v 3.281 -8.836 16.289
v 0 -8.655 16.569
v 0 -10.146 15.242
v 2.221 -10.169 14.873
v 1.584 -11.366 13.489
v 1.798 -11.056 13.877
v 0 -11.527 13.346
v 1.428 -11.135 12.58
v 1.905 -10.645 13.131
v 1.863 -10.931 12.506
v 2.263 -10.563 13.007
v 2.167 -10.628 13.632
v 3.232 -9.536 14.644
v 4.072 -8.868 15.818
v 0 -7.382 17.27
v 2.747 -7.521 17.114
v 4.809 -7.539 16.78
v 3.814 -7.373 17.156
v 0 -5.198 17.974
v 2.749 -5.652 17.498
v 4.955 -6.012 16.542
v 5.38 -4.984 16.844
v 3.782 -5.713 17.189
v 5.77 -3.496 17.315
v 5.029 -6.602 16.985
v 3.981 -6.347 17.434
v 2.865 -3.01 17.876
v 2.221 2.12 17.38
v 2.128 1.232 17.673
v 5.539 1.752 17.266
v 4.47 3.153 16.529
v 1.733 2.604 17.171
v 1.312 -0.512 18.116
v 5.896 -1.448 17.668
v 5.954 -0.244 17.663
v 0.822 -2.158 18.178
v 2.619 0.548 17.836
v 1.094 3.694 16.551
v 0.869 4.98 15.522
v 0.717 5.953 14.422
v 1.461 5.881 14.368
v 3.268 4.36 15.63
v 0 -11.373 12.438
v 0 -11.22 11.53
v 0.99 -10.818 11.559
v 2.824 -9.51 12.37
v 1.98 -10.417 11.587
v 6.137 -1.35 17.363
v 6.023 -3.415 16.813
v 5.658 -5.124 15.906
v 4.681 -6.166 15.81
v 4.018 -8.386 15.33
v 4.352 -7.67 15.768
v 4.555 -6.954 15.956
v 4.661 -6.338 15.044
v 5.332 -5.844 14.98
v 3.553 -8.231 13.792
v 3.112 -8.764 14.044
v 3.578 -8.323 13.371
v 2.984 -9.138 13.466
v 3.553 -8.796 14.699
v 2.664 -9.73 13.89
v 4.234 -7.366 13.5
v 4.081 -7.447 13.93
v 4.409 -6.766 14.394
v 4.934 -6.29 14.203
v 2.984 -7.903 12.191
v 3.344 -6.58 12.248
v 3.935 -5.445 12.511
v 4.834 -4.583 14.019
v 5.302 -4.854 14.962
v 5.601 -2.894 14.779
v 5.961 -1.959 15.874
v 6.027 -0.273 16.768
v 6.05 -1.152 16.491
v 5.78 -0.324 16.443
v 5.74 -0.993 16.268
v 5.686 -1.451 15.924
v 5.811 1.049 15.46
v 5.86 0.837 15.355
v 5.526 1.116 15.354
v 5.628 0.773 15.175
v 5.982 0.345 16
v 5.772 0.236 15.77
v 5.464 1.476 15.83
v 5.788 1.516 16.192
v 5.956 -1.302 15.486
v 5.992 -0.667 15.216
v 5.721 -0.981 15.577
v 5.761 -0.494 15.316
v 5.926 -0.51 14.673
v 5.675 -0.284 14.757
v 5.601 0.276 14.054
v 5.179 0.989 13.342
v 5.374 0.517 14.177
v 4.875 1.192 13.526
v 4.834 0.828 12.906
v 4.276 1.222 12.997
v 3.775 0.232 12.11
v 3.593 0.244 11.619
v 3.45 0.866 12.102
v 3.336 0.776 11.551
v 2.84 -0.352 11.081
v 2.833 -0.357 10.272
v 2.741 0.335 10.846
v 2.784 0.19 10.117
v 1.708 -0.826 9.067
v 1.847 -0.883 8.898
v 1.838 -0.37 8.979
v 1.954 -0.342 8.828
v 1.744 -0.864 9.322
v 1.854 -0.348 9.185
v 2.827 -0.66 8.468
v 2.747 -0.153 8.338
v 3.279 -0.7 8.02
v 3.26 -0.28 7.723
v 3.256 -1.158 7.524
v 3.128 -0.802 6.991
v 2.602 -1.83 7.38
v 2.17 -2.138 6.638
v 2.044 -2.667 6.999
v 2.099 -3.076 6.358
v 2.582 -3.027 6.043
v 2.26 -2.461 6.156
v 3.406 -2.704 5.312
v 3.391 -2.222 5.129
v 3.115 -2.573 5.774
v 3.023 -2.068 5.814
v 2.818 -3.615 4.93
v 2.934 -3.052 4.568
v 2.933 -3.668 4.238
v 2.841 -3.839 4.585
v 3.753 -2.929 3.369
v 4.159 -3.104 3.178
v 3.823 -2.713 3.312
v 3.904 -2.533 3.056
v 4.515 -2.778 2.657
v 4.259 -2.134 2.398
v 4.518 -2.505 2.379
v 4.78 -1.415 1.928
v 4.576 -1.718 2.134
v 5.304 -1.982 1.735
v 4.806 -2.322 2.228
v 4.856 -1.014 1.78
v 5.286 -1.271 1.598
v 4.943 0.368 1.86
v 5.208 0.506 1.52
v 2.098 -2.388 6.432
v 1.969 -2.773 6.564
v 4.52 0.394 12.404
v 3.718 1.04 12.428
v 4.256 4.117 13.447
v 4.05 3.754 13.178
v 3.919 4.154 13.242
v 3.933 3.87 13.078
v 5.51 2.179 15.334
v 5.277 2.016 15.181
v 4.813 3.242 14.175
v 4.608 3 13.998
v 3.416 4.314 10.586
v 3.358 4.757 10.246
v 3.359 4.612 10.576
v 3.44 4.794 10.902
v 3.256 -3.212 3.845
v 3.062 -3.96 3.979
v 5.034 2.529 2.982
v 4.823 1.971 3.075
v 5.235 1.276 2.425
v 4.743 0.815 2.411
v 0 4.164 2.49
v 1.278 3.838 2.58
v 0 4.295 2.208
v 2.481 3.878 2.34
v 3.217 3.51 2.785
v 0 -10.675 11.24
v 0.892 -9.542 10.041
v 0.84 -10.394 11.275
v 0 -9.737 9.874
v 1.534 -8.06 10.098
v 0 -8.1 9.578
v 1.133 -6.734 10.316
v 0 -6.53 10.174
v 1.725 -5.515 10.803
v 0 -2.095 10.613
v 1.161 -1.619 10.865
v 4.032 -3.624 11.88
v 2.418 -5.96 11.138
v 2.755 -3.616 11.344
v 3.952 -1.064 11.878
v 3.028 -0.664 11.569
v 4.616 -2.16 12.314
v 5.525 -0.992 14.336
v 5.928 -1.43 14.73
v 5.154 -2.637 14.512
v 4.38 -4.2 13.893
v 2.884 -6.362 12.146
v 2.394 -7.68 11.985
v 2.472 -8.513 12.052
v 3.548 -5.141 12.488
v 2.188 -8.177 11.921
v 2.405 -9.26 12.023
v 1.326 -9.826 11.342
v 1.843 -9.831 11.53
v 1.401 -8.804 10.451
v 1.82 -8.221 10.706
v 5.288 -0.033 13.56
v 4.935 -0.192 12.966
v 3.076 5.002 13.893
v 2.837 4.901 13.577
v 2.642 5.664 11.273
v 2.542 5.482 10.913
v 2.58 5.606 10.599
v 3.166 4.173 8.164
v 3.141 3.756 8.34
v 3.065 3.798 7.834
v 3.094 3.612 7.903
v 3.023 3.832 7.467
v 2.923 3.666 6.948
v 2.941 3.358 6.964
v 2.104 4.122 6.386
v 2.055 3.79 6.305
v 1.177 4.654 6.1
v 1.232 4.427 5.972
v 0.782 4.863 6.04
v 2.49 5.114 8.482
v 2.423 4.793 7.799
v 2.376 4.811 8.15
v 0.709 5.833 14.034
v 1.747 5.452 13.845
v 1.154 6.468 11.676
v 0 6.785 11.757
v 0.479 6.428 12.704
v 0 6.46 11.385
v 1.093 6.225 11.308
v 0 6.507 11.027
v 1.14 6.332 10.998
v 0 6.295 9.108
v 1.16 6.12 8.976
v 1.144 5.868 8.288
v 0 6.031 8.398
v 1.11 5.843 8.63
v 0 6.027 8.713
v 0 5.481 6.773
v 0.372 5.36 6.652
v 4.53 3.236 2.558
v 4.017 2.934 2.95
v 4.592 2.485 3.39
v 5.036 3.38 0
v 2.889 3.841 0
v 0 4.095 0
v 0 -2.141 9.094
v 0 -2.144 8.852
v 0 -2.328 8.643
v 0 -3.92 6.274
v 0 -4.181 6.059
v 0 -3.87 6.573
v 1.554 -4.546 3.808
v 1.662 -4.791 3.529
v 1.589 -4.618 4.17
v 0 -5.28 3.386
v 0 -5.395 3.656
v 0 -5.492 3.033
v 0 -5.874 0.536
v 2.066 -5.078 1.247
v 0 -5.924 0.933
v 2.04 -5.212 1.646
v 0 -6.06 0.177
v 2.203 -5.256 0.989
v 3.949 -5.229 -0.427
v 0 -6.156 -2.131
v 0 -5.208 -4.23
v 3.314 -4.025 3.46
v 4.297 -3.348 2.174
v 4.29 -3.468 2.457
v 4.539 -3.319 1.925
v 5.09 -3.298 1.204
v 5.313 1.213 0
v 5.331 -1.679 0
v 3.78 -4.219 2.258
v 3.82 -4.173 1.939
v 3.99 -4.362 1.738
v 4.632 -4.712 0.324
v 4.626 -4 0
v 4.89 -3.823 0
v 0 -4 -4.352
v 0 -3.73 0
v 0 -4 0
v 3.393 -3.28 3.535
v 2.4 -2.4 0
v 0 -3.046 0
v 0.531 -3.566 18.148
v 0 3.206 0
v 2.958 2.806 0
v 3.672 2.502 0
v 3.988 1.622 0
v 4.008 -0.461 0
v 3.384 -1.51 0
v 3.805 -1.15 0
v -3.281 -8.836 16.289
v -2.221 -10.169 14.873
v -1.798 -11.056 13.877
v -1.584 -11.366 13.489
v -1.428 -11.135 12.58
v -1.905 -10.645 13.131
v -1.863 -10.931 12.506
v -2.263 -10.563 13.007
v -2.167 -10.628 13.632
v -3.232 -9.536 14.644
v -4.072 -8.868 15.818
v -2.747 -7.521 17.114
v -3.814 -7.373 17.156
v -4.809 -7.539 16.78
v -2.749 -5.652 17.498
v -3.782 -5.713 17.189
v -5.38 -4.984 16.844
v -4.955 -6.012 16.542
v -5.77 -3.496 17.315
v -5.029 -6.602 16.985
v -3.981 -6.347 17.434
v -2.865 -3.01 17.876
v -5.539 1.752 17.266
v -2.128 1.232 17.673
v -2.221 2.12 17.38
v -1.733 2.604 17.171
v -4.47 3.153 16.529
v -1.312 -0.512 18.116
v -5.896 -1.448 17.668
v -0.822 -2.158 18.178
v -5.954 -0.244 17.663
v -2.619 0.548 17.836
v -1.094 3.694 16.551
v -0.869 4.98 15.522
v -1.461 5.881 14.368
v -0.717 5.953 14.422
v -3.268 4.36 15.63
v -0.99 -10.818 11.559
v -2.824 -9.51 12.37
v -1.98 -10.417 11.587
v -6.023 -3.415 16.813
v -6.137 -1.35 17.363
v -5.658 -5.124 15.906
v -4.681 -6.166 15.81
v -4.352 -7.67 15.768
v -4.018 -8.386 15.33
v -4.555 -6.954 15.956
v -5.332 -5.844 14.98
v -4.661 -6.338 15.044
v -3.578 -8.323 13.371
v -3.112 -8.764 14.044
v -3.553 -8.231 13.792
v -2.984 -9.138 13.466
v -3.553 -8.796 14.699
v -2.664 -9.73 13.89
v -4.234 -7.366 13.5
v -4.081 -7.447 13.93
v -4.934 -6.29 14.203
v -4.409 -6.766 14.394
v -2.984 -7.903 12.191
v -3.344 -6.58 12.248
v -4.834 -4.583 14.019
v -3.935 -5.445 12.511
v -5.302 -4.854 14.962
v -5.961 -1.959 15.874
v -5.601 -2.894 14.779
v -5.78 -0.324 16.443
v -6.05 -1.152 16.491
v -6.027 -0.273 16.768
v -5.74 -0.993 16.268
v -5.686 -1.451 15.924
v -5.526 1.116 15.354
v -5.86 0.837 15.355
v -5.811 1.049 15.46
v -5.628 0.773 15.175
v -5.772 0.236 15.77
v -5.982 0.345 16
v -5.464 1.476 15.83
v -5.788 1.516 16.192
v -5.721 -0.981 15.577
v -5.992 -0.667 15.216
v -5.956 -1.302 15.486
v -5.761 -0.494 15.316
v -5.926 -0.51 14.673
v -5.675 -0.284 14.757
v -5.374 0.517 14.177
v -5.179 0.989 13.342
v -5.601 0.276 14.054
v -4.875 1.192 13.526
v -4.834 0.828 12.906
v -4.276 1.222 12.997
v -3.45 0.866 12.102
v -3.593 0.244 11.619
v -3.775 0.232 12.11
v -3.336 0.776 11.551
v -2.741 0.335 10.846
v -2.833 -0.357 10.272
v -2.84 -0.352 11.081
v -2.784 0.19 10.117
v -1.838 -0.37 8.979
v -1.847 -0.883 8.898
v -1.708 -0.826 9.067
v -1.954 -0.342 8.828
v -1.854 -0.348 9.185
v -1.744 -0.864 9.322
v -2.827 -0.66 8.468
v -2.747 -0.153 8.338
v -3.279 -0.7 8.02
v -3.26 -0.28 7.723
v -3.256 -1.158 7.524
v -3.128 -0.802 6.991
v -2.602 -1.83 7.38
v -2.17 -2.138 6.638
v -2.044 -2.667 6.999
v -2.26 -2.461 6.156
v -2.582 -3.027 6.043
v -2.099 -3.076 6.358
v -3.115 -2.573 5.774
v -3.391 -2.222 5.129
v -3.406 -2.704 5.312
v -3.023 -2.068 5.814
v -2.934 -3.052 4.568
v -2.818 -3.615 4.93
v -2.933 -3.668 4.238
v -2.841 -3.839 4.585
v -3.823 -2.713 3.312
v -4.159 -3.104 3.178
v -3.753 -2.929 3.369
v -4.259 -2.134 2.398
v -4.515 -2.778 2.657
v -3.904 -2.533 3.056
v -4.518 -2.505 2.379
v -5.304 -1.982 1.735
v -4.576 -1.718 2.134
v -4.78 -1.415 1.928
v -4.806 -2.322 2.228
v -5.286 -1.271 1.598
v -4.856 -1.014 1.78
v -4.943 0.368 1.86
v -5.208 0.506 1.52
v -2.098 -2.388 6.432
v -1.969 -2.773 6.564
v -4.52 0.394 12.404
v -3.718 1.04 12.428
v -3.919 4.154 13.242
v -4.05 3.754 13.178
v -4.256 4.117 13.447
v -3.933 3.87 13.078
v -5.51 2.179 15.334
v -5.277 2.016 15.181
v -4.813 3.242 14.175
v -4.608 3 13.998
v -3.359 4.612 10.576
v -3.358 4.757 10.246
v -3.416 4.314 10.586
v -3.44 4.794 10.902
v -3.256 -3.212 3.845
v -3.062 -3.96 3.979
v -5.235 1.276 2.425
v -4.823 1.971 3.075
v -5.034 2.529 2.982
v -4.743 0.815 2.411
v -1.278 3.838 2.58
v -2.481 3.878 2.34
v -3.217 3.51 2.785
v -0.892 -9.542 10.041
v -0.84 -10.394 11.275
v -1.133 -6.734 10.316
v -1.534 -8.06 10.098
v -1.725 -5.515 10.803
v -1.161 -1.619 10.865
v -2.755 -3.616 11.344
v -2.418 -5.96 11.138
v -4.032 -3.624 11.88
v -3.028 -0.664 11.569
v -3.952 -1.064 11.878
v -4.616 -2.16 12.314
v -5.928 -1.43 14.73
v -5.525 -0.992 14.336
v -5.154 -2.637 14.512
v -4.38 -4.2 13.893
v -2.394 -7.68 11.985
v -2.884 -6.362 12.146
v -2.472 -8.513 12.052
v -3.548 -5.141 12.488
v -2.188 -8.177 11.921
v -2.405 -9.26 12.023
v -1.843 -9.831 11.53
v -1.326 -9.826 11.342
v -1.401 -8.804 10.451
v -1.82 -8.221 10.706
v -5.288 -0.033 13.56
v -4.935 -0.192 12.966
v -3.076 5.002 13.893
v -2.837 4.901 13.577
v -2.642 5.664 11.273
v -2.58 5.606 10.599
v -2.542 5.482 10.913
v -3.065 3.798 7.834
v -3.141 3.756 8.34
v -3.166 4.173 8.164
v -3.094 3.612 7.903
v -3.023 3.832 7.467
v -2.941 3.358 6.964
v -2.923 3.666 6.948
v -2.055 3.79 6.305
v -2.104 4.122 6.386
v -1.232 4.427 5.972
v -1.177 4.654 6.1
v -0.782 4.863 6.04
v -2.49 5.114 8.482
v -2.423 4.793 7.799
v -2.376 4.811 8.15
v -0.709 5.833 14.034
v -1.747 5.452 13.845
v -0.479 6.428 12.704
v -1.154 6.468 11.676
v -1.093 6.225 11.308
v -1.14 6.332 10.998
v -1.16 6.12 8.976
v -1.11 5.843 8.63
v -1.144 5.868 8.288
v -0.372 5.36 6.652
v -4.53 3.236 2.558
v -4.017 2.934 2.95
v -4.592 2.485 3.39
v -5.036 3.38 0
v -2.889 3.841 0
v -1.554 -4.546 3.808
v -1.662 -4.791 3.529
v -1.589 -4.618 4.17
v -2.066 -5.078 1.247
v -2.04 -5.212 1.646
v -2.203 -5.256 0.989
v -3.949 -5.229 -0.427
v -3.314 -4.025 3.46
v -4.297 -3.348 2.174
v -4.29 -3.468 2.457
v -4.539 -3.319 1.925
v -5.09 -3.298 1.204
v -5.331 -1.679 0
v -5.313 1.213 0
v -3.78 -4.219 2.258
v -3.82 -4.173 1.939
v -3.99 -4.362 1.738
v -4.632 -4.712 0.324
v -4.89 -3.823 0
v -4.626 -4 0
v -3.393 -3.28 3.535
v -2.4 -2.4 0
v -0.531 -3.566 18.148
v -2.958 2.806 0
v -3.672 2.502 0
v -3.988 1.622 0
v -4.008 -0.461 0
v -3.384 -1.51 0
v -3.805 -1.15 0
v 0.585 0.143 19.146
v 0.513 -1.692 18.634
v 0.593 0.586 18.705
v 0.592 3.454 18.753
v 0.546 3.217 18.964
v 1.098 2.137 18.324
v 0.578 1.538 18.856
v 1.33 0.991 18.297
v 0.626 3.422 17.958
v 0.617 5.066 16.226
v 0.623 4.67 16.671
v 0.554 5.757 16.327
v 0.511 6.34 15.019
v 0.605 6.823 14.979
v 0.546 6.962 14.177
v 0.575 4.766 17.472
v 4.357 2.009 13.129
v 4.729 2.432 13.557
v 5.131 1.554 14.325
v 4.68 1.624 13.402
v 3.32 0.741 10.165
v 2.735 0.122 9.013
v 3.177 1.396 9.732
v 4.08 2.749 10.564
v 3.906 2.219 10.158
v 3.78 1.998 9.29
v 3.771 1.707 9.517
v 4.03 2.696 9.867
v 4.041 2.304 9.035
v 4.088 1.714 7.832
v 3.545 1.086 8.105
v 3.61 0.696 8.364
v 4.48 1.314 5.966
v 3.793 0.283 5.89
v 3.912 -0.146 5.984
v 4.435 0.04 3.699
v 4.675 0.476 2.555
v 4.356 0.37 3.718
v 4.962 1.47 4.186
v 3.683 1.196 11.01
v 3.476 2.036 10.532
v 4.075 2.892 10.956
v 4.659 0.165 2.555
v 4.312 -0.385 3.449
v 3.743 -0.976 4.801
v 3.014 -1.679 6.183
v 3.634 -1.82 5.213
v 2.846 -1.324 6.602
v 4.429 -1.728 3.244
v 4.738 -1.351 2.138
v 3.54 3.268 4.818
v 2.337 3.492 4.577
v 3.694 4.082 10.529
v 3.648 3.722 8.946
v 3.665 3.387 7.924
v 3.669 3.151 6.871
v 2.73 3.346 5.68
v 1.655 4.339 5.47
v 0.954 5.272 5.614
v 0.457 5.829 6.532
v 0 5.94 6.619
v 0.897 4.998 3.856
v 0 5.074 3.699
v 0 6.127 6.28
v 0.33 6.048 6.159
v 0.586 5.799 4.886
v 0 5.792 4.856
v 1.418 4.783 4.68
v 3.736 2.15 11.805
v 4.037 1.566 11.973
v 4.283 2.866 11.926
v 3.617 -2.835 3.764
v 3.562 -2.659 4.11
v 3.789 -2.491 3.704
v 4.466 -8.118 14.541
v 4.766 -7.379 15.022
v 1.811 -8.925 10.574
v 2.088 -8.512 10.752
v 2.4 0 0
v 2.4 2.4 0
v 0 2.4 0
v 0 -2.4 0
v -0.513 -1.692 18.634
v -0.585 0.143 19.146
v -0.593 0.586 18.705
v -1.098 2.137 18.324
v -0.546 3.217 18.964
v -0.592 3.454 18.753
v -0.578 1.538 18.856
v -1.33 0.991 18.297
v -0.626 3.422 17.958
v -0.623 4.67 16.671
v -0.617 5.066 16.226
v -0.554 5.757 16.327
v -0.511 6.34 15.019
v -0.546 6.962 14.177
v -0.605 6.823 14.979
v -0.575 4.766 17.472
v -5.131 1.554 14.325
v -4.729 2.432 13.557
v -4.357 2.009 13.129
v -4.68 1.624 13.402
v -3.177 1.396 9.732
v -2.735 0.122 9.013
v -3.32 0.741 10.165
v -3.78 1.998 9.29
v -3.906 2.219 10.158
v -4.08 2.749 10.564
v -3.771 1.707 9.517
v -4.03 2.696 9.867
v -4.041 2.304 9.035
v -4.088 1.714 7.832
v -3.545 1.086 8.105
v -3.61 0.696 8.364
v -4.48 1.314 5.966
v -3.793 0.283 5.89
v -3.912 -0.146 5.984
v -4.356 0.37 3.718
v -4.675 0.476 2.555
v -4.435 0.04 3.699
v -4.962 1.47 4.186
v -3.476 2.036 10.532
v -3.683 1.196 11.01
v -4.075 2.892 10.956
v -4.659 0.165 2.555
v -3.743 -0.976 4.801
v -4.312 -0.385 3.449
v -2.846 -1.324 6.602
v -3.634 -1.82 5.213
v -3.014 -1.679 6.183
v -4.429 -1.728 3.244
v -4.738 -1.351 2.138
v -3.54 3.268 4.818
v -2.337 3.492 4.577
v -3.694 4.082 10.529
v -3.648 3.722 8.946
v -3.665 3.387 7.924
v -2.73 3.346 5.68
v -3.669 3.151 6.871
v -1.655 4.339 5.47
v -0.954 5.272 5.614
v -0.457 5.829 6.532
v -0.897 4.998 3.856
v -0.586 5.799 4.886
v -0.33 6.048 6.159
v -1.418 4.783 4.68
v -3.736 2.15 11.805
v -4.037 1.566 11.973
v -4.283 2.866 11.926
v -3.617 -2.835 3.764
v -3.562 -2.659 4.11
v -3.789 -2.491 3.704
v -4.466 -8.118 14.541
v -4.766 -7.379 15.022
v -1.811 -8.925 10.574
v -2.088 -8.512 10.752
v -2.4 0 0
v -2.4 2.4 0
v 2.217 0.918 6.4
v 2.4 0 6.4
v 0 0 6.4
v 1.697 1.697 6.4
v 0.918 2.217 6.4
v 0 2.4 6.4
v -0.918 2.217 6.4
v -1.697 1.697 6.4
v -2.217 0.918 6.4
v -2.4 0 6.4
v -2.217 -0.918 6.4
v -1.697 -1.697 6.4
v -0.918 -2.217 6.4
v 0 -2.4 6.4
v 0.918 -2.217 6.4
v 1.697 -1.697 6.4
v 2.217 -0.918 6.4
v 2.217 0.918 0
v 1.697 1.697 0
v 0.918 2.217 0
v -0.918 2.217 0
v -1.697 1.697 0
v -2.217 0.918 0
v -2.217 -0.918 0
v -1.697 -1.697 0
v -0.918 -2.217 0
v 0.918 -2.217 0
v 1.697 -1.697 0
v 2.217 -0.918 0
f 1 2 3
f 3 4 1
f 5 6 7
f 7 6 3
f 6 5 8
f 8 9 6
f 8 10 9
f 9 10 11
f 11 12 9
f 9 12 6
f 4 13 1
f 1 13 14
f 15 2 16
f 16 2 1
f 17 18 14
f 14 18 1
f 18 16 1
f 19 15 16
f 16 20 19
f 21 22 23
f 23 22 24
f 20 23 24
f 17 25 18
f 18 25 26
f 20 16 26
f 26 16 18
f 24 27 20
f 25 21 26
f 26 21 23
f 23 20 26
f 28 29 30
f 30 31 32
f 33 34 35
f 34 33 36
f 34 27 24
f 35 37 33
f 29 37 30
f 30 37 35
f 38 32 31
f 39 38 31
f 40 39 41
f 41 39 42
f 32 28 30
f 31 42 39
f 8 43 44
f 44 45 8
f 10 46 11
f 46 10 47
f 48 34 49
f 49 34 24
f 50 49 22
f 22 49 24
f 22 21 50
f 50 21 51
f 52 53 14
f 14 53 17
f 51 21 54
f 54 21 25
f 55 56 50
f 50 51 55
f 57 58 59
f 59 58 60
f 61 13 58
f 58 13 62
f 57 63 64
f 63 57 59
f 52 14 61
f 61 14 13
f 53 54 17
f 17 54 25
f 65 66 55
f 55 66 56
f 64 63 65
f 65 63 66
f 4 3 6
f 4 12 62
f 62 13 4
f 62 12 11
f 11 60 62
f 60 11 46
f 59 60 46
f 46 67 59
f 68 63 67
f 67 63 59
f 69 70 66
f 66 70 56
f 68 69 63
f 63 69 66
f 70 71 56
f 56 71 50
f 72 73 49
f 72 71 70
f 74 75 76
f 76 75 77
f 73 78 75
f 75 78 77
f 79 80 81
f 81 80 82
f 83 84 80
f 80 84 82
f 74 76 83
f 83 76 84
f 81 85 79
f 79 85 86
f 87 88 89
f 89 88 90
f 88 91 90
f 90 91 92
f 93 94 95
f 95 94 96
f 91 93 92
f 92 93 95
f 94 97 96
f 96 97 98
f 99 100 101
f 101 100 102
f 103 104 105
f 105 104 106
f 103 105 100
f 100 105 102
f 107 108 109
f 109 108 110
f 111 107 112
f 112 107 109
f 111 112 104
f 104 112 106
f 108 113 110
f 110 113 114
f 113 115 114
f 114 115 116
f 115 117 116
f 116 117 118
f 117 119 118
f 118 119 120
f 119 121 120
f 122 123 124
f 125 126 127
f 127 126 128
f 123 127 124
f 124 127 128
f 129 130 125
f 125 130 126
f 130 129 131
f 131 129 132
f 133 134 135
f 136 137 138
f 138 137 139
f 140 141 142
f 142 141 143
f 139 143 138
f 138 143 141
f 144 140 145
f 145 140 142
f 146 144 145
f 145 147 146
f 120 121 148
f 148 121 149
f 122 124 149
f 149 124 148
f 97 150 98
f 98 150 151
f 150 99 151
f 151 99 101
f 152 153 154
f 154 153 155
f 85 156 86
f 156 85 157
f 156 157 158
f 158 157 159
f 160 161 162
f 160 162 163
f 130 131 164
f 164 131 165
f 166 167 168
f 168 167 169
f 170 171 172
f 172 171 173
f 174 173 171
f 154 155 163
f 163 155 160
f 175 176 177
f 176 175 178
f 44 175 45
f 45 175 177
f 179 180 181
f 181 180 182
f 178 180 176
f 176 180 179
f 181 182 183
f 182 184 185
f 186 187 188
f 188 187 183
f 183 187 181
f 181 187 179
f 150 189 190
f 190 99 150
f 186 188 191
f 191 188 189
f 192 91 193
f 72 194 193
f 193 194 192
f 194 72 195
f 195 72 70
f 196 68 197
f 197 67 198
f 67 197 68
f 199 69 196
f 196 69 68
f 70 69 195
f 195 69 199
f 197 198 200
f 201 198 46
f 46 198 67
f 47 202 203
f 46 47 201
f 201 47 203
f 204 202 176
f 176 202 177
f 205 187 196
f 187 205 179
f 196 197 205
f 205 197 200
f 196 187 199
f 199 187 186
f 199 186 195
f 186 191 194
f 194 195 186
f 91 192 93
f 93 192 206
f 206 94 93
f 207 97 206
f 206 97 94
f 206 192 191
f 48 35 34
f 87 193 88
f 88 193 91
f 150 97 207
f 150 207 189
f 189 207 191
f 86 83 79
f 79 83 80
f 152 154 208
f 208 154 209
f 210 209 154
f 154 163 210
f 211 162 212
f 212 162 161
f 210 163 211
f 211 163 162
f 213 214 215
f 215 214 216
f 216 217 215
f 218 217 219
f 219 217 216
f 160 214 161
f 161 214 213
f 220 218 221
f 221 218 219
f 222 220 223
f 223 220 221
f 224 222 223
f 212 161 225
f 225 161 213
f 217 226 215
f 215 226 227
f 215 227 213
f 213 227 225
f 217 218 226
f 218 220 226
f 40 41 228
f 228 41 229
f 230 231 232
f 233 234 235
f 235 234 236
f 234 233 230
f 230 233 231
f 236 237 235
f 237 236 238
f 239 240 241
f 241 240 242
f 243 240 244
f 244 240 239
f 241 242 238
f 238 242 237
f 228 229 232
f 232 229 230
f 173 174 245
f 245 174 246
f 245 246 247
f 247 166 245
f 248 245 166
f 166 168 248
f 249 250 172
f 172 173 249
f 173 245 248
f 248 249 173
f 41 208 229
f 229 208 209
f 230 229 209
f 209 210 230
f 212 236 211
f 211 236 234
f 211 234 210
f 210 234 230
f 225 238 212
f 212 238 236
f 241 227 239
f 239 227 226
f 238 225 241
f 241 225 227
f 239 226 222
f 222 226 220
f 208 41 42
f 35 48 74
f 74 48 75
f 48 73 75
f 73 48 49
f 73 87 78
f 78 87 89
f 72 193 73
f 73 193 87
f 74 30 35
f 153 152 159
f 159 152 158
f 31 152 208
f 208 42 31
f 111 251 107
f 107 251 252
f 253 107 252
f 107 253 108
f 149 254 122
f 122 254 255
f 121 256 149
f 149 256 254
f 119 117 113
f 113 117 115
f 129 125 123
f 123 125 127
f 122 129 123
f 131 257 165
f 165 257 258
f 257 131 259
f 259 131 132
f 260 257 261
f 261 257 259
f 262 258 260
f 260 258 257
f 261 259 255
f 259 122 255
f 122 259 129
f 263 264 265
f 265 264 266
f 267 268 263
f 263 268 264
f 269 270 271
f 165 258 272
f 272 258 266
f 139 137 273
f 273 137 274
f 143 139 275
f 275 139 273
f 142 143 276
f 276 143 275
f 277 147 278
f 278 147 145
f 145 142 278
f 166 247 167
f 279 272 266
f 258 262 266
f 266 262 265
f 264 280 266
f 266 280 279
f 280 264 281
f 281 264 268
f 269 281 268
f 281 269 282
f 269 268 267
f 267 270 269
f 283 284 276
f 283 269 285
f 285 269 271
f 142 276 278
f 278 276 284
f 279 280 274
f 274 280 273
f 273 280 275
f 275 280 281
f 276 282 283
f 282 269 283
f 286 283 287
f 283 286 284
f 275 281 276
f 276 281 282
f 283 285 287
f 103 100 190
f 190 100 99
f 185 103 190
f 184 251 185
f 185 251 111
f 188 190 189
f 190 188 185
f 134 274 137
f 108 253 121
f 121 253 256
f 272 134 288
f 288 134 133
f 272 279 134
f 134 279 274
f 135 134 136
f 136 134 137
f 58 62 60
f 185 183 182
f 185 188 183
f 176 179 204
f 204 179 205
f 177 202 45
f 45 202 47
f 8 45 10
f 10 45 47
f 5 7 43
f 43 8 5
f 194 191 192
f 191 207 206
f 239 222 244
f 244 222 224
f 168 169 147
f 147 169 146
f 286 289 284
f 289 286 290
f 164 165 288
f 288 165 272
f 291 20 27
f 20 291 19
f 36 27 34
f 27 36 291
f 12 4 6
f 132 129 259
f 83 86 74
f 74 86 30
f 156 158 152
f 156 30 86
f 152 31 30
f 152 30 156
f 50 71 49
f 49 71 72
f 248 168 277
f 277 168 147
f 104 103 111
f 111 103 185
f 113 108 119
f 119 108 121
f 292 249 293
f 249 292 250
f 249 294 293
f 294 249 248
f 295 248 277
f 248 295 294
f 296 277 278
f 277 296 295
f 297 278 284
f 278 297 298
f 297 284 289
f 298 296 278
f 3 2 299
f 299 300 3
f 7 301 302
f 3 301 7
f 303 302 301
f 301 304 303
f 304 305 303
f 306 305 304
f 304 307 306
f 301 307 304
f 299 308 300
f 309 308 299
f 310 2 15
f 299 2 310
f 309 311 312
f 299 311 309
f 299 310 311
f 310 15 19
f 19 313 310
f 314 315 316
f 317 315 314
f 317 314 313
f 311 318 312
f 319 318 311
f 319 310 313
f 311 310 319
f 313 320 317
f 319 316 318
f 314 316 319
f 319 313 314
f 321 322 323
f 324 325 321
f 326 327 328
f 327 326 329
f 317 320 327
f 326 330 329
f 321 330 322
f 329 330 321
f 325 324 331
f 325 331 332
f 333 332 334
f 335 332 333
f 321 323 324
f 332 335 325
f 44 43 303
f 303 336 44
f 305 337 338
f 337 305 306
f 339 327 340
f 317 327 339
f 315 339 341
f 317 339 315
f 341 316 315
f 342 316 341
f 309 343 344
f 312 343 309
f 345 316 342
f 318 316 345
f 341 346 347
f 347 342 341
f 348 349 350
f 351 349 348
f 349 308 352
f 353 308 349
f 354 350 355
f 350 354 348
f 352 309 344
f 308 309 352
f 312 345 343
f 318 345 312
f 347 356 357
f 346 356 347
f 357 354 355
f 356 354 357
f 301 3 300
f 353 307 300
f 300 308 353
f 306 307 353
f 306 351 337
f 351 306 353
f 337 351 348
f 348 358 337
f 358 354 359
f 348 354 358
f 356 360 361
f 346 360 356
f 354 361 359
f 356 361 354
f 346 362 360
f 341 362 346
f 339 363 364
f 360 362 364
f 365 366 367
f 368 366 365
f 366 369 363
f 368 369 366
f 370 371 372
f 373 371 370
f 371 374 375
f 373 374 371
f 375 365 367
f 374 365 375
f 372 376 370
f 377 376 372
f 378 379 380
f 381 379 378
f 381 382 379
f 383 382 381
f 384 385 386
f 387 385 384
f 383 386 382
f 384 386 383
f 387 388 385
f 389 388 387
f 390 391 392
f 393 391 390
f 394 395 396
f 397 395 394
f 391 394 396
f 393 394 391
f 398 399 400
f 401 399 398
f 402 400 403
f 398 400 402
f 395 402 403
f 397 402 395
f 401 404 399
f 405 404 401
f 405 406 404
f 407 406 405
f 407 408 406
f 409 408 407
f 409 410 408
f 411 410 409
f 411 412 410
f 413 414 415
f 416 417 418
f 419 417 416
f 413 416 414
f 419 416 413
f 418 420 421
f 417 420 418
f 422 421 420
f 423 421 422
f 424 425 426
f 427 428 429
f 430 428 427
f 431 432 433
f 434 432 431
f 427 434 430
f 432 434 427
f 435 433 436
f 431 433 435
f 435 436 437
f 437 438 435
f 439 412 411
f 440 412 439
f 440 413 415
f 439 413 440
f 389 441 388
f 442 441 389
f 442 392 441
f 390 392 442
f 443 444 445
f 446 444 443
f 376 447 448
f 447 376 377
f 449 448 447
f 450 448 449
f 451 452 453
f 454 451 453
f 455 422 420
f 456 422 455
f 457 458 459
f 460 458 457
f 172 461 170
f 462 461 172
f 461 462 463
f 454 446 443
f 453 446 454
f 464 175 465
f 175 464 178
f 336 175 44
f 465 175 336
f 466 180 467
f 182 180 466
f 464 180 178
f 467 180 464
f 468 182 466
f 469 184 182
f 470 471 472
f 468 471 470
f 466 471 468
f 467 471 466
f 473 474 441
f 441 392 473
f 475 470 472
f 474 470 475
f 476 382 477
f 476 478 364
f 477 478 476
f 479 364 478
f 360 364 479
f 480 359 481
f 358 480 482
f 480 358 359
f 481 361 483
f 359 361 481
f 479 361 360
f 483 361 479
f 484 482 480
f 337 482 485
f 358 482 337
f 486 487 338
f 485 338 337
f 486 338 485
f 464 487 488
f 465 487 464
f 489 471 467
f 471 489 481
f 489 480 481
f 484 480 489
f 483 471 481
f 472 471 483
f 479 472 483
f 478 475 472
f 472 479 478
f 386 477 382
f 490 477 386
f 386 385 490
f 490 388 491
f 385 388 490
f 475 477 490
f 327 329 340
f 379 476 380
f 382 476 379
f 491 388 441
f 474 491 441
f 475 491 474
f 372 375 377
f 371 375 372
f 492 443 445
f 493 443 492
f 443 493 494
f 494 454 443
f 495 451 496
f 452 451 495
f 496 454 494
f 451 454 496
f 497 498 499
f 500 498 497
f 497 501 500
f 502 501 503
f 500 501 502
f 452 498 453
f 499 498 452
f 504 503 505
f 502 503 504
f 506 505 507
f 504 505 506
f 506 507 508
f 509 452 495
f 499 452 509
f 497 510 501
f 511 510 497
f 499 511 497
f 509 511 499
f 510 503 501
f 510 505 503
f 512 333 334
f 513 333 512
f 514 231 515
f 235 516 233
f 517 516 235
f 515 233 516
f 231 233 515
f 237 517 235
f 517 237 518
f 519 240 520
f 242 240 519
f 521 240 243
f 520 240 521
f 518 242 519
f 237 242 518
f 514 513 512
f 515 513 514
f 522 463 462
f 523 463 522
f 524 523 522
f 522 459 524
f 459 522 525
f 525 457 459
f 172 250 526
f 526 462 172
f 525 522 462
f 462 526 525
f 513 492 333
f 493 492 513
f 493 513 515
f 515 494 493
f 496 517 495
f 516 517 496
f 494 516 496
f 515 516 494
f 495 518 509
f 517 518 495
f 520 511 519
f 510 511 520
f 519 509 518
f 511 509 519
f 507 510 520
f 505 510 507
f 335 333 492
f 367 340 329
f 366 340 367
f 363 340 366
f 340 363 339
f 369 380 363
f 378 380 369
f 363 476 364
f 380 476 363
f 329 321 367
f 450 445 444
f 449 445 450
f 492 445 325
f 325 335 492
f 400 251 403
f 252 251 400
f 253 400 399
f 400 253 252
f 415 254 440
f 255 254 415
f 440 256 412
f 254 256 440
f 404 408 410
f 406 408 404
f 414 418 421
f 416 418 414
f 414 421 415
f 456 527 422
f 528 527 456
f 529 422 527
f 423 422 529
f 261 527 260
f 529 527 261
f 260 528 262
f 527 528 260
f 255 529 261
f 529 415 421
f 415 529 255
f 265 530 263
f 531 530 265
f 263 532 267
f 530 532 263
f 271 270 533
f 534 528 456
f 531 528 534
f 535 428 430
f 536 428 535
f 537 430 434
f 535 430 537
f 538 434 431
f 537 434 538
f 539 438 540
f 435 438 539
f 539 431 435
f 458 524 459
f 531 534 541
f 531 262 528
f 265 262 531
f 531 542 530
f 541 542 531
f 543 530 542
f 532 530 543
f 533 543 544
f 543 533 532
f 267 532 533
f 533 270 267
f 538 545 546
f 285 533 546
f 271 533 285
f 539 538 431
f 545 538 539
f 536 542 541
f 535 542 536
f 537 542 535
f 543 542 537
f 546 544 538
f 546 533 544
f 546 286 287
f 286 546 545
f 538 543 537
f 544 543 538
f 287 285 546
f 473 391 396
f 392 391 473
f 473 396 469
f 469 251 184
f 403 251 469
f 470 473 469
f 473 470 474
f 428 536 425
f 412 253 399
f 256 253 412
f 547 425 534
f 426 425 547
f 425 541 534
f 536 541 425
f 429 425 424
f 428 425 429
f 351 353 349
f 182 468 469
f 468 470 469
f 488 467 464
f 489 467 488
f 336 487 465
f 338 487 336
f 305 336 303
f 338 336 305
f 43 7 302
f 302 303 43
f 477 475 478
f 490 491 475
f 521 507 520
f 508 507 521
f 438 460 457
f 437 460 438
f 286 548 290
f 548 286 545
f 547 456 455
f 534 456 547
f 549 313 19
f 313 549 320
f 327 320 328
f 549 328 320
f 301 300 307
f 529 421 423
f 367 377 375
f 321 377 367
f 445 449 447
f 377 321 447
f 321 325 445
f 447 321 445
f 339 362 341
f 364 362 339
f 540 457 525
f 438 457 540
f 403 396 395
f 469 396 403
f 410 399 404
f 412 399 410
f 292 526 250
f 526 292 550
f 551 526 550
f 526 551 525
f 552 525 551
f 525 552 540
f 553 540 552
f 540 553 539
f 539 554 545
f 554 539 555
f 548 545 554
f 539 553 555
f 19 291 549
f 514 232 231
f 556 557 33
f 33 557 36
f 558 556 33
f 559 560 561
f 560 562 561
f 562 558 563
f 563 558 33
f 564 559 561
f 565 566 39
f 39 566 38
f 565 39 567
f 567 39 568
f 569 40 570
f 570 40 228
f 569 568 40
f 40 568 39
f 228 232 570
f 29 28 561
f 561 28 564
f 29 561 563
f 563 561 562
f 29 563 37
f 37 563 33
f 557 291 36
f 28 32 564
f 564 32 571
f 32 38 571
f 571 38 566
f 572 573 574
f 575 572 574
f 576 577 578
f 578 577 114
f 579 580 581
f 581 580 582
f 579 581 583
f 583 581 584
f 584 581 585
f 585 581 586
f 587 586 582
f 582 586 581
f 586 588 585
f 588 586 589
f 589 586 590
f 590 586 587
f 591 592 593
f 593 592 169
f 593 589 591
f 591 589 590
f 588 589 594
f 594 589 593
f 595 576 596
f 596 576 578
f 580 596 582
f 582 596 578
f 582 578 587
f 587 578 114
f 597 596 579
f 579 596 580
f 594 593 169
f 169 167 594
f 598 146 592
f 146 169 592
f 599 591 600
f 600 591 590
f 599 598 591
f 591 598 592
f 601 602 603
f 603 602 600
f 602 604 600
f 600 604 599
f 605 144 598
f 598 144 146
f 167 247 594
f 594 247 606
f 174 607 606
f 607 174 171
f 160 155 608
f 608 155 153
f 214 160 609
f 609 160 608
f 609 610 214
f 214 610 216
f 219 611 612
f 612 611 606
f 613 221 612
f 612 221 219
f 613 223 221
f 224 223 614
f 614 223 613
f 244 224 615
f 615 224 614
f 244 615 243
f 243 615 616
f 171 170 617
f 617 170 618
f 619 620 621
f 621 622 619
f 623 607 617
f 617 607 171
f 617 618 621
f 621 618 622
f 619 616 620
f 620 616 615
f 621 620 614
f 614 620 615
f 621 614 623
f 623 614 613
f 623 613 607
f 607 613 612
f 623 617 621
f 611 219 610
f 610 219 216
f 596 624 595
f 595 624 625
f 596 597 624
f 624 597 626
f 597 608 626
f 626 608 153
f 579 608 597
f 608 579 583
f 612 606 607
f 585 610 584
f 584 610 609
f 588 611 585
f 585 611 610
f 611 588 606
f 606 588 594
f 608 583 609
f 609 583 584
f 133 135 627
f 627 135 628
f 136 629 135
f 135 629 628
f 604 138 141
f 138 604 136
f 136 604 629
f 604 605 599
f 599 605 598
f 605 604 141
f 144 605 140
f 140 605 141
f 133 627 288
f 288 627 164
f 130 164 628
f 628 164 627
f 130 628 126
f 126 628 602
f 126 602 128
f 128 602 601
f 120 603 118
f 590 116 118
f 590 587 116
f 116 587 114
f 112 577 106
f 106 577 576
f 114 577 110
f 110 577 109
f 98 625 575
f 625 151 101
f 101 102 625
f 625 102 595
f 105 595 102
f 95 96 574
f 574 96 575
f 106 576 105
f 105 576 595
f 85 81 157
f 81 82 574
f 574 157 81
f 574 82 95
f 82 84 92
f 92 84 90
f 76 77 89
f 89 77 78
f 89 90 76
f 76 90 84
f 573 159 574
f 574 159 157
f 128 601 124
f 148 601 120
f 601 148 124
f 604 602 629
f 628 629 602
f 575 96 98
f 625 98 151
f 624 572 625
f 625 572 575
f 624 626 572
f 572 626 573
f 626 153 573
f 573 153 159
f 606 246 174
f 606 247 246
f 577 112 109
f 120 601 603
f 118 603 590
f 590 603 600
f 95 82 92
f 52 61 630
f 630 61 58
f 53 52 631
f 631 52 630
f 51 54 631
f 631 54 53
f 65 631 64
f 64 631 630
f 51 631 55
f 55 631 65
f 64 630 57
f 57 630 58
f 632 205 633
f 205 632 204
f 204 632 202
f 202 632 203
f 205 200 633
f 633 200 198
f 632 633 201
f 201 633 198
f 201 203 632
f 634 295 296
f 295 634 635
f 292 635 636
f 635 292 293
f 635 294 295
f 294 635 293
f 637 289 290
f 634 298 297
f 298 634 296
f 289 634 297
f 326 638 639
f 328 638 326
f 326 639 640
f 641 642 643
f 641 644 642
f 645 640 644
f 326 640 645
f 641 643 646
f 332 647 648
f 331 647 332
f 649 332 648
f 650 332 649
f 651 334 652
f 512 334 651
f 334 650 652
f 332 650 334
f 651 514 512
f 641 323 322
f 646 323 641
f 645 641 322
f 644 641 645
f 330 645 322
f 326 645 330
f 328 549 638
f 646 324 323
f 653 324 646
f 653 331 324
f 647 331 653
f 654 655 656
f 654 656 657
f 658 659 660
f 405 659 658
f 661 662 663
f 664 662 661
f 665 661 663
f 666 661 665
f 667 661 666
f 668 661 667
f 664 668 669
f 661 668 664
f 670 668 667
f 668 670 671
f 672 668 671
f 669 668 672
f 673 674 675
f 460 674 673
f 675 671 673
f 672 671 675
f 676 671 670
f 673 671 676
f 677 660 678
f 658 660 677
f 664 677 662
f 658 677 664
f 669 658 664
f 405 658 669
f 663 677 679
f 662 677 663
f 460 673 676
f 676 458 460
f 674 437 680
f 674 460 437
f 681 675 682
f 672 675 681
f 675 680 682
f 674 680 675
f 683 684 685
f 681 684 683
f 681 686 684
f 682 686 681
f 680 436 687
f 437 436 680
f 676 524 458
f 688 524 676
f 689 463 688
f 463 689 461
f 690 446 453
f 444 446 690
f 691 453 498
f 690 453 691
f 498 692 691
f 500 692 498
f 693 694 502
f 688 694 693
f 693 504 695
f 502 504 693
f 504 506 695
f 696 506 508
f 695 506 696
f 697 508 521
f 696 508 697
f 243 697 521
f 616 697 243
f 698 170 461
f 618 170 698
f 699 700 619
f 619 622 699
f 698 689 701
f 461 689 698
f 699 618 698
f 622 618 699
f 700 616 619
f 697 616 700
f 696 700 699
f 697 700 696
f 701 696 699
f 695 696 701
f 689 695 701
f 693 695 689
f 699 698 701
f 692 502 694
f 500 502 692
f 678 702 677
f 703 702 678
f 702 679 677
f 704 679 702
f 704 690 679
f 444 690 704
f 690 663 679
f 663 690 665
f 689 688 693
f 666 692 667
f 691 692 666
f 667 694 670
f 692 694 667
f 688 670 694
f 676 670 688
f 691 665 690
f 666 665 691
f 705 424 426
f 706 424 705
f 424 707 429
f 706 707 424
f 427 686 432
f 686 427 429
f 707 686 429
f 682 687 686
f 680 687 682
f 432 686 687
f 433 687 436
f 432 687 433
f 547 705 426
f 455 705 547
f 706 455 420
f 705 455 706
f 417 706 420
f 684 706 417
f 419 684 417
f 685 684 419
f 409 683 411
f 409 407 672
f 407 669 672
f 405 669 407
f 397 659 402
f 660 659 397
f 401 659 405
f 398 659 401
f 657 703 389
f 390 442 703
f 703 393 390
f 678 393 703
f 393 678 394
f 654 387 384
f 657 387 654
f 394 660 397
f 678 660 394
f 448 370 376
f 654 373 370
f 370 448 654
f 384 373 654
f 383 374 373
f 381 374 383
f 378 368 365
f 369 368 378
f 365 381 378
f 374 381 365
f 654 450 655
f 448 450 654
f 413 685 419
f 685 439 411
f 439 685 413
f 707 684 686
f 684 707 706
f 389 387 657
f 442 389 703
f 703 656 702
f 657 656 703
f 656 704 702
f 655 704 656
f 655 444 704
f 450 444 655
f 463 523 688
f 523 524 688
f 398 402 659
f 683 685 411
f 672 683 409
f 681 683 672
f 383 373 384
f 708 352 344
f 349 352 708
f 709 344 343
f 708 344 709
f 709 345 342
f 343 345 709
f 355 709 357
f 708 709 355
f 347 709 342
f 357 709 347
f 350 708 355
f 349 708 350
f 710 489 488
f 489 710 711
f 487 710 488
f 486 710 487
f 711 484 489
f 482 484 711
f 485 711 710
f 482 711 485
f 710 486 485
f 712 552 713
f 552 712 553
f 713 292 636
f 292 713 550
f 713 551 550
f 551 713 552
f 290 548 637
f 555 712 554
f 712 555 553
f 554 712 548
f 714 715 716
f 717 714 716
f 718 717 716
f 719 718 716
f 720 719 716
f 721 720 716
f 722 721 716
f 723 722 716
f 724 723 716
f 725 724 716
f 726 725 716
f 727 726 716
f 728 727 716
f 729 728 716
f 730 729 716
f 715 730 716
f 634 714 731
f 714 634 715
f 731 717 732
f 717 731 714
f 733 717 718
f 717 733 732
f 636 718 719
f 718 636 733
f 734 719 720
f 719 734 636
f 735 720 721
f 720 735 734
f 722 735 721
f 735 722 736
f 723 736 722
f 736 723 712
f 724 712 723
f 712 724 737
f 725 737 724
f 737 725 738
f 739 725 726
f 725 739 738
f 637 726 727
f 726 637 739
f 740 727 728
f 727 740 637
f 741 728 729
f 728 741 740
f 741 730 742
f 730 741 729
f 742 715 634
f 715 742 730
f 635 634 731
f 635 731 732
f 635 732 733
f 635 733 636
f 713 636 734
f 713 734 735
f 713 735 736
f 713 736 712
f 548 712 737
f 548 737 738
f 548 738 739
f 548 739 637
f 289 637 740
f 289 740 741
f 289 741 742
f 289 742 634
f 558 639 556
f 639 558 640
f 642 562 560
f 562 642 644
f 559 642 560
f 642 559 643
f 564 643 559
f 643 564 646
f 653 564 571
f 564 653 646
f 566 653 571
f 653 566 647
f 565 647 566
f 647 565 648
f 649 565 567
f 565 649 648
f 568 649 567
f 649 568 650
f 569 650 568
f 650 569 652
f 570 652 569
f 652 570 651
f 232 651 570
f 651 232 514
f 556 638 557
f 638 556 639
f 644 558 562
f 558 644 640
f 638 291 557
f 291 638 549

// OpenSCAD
use <../lib.scad>
use <s/49588s01.scad>
use <s/49588s03.scad>
function ldraw_lib__49588p03() = [
// 0 Minifig Head Snake with Closed Mouth with Orange Flames and Eyes Pattern
// 0 Name: 49588p03.dat
// 0 Author: Philippe Hurbain [Philo]
// 0 !LDRAW_ORG Part UPDATE 2023-04
// 0 !LICENSE Licensed under CC BY 4.0 : see CAreadme.txt
// 
// 0 BFC CERTIFY CCW
  [0,"BFC","CERTIFY"],
  [0,"BFC","CCW"],
// 
// 0 !KEYWORDS Bricklink 49588pb03, Ninjago, Rebrickable 49588pat0004, Set 71764
// 
// 0 !HISTORY 2023-08-25 [OrionP] Official Update 2023-04
// 
// 
// 1 16 0 0 0 1 0 0 0 1 0 0 0 1 s\49588s01.dat
  [1,16,0,0,0,1,0,0,0,1,0,0,0,1, ldraw_lib__s__49588s01()],
// 1 25 0 0 0 1 0 0 0 1 0 0 0 1 s\49588s03.dat
  [1,25,0,0,0,1,0,0,0,1,0,0,0,1, ldraw_lib__s__49588s03()],
];
module ldraw_lib__49588p03(step=0, col=false, unit=2/5, alt=false, line=0.2, solid=!$preview)
    makepoly(ldraw_lib__49588p03(), step=step, col=col, unit=unit, alt=alt, line=line, solid=solid);
ldraw_lib__49588p03(line=0.2);
